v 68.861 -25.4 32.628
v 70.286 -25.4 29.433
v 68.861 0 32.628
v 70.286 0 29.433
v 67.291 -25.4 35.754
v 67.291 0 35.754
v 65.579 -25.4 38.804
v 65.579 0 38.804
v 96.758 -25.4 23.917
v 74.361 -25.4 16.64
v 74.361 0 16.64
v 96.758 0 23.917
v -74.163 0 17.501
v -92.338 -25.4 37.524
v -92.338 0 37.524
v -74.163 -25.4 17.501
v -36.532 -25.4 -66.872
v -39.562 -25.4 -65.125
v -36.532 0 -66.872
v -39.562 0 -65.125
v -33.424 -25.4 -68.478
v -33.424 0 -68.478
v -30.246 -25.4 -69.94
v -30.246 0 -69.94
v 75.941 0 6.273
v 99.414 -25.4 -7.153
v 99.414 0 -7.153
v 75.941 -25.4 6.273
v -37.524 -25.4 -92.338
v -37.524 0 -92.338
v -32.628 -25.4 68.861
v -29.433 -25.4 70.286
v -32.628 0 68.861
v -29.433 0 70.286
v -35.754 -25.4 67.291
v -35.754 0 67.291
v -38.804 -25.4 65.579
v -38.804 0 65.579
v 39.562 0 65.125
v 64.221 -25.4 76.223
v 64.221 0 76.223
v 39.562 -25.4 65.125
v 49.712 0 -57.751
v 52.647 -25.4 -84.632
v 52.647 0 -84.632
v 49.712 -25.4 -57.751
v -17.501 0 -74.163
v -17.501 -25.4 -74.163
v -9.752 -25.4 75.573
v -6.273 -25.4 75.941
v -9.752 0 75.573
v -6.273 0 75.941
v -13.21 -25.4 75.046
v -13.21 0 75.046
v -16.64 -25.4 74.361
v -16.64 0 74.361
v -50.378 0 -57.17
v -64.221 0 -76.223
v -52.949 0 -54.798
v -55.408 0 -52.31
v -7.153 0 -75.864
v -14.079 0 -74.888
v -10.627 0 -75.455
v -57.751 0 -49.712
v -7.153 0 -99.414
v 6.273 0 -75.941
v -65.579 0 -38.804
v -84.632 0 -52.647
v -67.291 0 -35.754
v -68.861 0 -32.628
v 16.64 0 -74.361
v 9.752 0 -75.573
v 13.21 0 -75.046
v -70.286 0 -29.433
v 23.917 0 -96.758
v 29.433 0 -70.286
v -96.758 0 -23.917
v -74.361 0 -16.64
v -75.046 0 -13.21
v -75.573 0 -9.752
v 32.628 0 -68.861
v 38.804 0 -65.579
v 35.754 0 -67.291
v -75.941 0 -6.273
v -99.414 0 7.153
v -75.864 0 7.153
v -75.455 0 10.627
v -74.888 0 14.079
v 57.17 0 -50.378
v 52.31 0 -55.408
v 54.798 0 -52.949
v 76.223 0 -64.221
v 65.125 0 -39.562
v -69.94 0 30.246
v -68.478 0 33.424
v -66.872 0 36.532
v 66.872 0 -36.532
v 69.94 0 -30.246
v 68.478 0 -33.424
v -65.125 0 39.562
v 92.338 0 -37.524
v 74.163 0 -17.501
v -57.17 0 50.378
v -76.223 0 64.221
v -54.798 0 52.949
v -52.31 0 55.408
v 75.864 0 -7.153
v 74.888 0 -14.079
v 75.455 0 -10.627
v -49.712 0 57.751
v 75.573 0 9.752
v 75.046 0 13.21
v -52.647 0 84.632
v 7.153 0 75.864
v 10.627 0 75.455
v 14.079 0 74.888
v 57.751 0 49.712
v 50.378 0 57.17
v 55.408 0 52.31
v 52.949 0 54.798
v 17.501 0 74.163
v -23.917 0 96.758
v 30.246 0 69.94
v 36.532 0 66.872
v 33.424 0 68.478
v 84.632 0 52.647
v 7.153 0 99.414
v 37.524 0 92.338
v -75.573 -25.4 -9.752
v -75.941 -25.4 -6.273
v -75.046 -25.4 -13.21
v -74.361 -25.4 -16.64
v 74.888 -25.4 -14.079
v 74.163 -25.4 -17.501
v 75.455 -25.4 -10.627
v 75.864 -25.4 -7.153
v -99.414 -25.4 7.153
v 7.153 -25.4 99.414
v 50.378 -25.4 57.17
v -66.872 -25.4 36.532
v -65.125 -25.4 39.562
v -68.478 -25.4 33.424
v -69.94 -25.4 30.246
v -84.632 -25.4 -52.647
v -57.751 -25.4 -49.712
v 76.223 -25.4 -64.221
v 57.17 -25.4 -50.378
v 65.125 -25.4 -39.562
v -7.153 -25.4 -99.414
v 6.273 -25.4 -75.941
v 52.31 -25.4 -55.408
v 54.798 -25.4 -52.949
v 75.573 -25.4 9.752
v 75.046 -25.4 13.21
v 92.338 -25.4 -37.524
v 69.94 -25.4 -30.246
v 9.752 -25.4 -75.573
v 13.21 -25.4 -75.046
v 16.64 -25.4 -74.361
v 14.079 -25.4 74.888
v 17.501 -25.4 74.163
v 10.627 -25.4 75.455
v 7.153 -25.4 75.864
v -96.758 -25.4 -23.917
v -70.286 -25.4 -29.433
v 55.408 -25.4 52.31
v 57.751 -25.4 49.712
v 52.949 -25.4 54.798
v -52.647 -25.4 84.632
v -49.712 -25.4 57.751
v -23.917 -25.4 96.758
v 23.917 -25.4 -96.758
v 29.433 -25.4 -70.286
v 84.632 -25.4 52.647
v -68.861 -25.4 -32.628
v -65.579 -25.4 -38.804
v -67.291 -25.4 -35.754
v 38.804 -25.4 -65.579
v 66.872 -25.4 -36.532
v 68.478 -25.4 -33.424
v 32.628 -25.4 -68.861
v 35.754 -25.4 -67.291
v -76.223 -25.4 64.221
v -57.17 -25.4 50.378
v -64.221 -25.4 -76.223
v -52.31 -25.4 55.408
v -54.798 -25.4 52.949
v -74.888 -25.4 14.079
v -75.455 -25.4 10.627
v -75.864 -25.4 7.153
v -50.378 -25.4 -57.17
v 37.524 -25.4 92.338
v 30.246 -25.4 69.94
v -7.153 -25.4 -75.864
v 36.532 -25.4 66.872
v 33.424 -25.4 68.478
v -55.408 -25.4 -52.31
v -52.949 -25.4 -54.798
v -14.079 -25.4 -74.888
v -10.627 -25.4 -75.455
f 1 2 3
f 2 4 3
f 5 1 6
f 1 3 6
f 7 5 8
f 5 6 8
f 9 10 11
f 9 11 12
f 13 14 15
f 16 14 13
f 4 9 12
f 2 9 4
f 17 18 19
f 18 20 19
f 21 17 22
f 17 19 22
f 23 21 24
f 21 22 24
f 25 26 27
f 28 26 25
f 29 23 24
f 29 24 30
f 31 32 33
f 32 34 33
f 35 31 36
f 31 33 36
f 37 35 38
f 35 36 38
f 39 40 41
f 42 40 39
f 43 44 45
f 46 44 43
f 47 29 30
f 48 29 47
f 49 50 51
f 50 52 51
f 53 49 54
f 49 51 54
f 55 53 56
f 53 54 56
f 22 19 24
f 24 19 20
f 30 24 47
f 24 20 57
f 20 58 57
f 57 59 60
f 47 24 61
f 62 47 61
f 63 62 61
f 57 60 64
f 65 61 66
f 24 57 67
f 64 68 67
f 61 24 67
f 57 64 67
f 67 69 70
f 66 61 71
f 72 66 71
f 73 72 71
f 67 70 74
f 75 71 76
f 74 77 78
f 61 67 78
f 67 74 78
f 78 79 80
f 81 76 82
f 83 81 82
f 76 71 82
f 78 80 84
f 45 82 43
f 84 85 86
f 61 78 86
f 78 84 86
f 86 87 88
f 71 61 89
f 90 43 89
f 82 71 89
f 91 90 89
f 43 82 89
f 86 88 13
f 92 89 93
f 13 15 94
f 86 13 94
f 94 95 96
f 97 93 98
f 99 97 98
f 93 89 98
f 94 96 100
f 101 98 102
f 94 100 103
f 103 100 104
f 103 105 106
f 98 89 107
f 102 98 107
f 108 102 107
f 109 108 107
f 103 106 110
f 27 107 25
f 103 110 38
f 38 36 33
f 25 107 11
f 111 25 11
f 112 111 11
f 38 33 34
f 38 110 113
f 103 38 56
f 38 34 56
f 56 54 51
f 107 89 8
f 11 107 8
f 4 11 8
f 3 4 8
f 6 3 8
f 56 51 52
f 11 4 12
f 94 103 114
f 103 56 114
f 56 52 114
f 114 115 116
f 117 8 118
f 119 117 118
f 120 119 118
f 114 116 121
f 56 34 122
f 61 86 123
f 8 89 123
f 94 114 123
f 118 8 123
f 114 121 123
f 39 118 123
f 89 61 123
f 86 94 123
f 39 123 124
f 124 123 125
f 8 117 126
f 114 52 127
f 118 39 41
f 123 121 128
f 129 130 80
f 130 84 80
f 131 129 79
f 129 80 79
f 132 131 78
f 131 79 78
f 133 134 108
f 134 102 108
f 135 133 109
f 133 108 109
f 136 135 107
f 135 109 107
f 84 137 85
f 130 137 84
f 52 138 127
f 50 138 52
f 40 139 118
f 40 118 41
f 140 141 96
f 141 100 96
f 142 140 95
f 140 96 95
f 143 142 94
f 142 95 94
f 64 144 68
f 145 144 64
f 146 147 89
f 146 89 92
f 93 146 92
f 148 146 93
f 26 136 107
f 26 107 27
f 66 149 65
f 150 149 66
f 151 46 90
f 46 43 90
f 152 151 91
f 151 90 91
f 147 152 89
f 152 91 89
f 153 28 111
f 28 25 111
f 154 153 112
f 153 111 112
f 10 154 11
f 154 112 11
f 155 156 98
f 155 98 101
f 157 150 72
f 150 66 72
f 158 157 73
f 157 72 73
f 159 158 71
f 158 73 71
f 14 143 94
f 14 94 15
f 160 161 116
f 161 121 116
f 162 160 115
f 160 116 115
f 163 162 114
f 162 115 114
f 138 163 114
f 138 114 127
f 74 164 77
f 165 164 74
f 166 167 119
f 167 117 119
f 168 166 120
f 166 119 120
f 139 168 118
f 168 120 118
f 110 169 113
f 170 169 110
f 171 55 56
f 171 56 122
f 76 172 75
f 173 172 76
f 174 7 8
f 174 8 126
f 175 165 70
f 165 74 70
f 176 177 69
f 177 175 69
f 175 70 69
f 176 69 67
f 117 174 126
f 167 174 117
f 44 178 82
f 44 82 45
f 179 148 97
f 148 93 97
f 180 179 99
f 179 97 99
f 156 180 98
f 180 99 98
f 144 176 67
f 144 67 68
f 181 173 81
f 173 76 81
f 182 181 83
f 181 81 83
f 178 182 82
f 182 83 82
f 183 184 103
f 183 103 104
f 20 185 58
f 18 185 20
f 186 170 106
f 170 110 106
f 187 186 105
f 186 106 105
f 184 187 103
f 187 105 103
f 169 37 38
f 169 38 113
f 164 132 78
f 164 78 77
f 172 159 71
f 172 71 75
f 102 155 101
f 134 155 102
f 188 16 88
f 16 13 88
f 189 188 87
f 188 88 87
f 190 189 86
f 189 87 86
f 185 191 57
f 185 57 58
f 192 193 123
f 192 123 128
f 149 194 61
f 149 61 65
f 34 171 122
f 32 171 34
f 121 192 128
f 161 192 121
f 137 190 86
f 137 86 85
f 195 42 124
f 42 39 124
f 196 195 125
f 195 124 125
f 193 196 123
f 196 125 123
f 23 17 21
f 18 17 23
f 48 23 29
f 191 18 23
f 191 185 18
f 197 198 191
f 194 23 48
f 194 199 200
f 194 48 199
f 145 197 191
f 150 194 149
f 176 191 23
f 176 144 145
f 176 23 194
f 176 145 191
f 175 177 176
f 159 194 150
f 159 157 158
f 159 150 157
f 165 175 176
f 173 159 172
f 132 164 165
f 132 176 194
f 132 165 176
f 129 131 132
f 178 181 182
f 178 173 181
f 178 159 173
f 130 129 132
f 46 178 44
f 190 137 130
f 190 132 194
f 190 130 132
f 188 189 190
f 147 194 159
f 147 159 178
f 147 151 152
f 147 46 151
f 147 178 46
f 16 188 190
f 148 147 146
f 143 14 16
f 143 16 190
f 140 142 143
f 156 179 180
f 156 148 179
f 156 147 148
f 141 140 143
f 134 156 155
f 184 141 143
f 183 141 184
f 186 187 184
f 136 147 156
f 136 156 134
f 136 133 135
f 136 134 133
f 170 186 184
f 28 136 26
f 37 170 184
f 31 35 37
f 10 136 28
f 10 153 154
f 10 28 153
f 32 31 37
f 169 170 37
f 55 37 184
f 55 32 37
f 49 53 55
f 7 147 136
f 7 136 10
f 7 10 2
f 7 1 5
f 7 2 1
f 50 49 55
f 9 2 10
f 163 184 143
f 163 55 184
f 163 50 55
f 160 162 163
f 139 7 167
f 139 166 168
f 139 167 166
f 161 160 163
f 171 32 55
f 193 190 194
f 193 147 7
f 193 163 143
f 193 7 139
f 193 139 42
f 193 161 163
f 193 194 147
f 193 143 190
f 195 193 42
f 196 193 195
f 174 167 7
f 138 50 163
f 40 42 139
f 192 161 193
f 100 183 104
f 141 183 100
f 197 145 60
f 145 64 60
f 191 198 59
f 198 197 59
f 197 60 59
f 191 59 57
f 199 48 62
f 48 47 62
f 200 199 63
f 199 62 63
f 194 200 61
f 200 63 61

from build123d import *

# Parameters (mm, degrees)
F0_R     = 76.2
F1_DEPTH = 25.4
F3_DEPTH = 25.4
F4_COUNT = 20


with BuildPart() as f1:
    # F0 (on Front) → F1 (new body)
    with BuildSketch(Plane.XZ):
        Circle(F0_R)
    extrude(amount=F1_DEPTH)

    # F2 (on face) → F3 (join, through all)
    with BuildSketch(Plane.XZ.offset(25.4)):
        Polygon((7.153107319, 99.4136035442), (-6.2727834728, 75.941373358), (7.153107319, 75.8635159723), align=None)
    extrude(amount=-F3_DEPTH)

    # F4: F1 ×20 about axis
    f4_axis = Axis((0, 0, 0), (0, 1, 0))


with BuildPart() as f1_1:
    add(f1.part)
    for i in range(1, F4_COUNT):
        add(f1.part.rotate(f4_axis, i * 360 / F4_COUNT))


solid = f1_1.part
